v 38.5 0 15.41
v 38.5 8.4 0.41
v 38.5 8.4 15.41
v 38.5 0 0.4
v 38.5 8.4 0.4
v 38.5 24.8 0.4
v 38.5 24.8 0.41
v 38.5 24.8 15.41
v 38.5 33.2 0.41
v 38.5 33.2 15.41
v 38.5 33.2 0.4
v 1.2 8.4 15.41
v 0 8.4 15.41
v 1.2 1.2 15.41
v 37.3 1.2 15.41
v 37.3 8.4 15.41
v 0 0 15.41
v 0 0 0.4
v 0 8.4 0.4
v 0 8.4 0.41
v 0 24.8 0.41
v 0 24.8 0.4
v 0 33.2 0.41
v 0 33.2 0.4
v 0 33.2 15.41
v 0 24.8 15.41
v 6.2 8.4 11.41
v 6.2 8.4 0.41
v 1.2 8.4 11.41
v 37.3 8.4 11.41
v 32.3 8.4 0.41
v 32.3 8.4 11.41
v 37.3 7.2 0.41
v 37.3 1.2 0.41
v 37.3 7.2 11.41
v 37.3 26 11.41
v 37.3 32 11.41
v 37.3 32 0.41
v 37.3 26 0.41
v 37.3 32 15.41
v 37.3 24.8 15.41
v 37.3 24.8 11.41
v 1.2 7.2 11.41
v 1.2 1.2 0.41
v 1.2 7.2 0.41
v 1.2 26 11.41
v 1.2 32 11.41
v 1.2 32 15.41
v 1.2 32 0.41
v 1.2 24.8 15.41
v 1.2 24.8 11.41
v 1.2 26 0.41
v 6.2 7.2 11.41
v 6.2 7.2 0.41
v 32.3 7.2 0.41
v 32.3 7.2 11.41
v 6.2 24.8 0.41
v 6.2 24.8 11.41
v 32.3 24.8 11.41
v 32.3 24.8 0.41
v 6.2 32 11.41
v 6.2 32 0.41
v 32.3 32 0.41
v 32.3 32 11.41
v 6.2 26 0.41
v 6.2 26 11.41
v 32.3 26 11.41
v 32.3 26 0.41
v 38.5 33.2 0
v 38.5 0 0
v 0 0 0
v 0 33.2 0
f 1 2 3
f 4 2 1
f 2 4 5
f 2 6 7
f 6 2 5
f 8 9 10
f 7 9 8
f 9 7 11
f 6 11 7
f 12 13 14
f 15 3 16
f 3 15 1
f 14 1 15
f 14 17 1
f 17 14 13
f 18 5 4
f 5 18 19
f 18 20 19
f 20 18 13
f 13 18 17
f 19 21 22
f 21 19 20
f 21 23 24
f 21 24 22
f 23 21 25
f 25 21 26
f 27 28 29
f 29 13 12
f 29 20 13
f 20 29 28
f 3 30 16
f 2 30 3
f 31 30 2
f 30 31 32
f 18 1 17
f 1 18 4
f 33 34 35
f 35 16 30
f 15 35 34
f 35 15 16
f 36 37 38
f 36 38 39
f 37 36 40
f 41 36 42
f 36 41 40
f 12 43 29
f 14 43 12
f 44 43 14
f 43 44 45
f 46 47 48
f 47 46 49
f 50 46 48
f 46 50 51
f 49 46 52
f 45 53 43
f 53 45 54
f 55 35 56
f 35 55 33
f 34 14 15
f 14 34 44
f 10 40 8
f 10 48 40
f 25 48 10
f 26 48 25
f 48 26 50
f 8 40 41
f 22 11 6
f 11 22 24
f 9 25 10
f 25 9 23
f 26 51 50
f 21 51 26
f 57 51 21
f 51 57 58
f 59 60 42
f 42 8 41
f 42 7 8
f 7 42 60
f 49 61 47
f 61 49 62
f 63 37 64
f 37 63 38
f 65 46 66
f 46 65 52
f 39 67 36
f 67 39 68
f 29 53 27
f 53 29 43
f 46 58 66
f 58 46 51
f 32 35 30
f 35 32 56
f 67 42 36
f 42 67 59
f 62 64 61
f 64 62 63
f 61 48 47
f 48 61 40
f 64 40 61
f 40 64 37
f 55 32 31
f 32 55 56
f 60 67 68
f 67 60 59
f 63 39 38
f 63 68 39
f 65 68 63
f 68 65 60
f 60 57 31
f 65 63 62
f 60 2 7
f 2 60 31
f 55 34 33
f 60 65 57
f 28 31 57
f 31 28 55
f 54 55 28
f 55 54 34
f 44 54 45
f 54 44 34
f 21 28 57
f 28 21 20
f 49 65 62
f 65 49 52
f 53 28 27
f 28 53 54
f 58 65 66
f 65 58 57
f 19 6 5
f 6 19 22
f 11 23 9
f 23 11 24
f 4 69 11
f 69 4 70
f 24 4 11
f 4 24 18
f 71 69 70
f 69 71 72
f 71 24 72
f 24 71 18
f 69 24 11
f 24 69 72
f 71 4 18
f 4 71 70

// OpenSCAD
// file: ../../Base/Boxes.scad
// Fischertechnik Box Foundation
// Pre-designed Boxes

use <Constants.scad>

include <PlacementOptions.scad>

box190Width = 190;
box190Depth = 130;
box130Width = 130;
box130Depth = 95;
boxUsageHeight = 33.9;
boxWallThickness = 2.4;
boxBaseThickness = 1.0;
boxWebWidth = 3.0;

// getBoxWallThickness()
// Gets the wall thickness of a Fischertechnik Box

function getBoxWallThickness() = boxWallThickness;

// Gets the usable height of a fischertechnik box
function getBoxUsageHeight() = boxUsageHeight;

// Gets the thickness of the Fischertechnik box base.
function getBoxBaseThickness() = boxBaseThickness;

// Gets the width of a box web
function getBoxWebWidth() = boxWebWidth;

// Gets the usable inner space of a Box 190 as an x/y-list
function getBox190Space() = [
    box190Width - 2*getBoxWallThickness(), 
    box190Depth - 2*getBoxWallThickness() ];

// Imports the Fischertechnik empty box 130x190 mm and places it at position 0,0
// 190x130 are the outer sizes, the inner space is slightly smaller. Use getBox190Space() to get the inner sizes.
// This module needs the STL file "Fischertechnik Box 130x190.stl" in the library path.
// The box is positioned that the usable inner space is at the 0,0,0 position. The

module Box190() {
    translate([-getBoxWallThickness(),-getBoxWallThickness(),-getBoxBaseThickness()])
        import("Fischertechnik Box 130x190.stl", convexity=3);
}

// Gets the usable inner space of a Box 130 as an x/y-list
function getBox130Space() = [
    box130Width - 2*getBoxWallThickness(), 
    box130Depth - 2*getBoxWallThickness() ];

// Imports the Fischertechnik empty box 95x130 mm and places it at position 0,0
// 190x130 are the outer sizes, the inner space is slightly smaller. Use getBox190Space() to get the inner sizes.
// This module needs the STL file "Fischertechnik Box 95x130.stl" in the library path.
// The box is positioned that the usable inner space is at the 0,0,0 position. The

module Box130() {
    translate([-getBoxWallThickness(),-getBoxWallThickness(),-getBoxBaseThickness()])
        import("Fischertechnik Box 95x130.stl", convexity=3);
}

// Creates a web at the specified box walls
// corner 0 = LowerLeft, 1 = UpperLeft, 2 = UpperRight, 3 = LowerRight
// side 0 = LeftOfCorner, 1 = RightOfCorner
// distance = Distance in mm from the corner
// box = inner width and depth of the box (default: Box 190)
// webWidth = length of the web (default is 3 mms)
// webThickness = thickness of the web (default is 1 mm)

module BoxWeb(corner, side, distance, box=getBox190Space(), webWidth=getBoxWebWidth(), webThickness=1.0) {
    sink = getBoxWallThickness()/2;

    width = (corner % 2 == 0) ? 
            (side == LeftOfCorner ? webWidth : webThickness) :
            (side == LeftOfCorner ? webThickness : webWidth);

    depth = (corner % 2 == 0) ? 
            (side == RightOfCorner ? webWidth : webThickness) :
            (side == RightOfCorner ? webThickness : webWidth);
    
    xDiff = corner == LowerLeft ? 
                (side == LeftOfCorner ? -sink : distance) :
            (corner == UpperLeft ?                
                (side == LeftOfCorner ? distance : -sink) :
            (corner == UpperRight ?
                (side == LeftOfCorner ? box.x-webWidth+sink : box.x-distance-webThickness) :
                (side == LeftOfCorner ? box.x-distance-webThickness: box.x-webWidth+sink)));

    yDiff = corner == LowerLeft ? 
                (side == RightOfCorner ? -sink : distance) :
            (corner == UpperLeft ?
                (side == RightOfCorner ? box.y-distance : box.y-webWidth+sink) :
            (corner == UpperRight ?
                (side == RightOfCorner ? box.y-webWidth+sink : box.y-distance) :
                (side == RightOfCorner ? distance : -sink)));
    
    translate([xDiff, yDiff, -getExcess()])
        cube([width, depth, boxUsageHeight + 2*getExcess()]);
}
// file: ../../Base/Rotation.scad
// Fischertechnik Box Foundation
// Geometry Helpers Rotation

include <PlacementOptions.scad>

// getRotatedSpace(space, rotation=NoRotation)
// Rotates the space dependent on the specified rotation

function getRotatedSpace(space, rotation=NoRotation) = [
    (rotation == Rotate90 || rotation == Rotate270) ? space.y : space.x,
    (rotation == Rotate90 || rotation == Rotate270) ? space.x : space.y
];

// Rotates the given space around the fixed left lower corner
// space = the space the children needs as width/depth list [width,depth]
// rotation = 0 Rotate0 degrees, 1 Rotate90 degrees, 2 Rotate180 degrees, 3 Rotate270 degrees (equivalent to -90)

module RotateFix(space, rotation=Rotate0) {
    dy = (rotation == Rotate0 || rotation == Rotate270) ? 0 :
        (rotation == Rotate90) ? space.x :
        space.y;
    dx = (rotation < Rotate180) ? 0 :
        (rotation == Rotate180) ? space.x :
        space.y;
    
    translate([dx, dy, 0])
        rotate([0, 0, rotations[rotation]])
            children();
}
// file: ../../Base/Alignment.scad
// Fischertechnik Box Foundation
// Geometry Helpers Alignment

include <PlacementOptions.scad>

// getAlignedX(elementWidth, spaceWidth, align=AlignRight, offset=0)
// Gets the aligned X offset of an element with the given
// width in the given space.
// elementWidth = The width of the element to positon
// spaceWidth = The space where the element should be aligned
// align = 0 AlignLeft, 1 AlignCenter, 2 AlignRight
// offset = an optional offset from the aligned position. When
// aligned left or centered, then positive values are in X direction.
// When aligned right then positive values are in negative X direction.

function getAlignedX(elementWidth, spaceWidth, align=AlignRight, offset=0) =
    (align == AlignLeft) ?
        offset :
        ((align == AlignCenter) ?
        (spaceWidth - elementWidth)/2 + offset :
        spaceWidth - offset - elementWidth);

// getAlignedY(elementDepth, spaceDepth, align=AlignTop, offset=0)
// Gets the aligned Y offset of an element with the given
// depth in the given space.
// elementDepth = The depth of the element to positon
// spaceDepth = The space where the element should be aligned
// align = 0 AlignBottom, 1 AlignCenter, 2 AlignTop
// offset = an optional offset from the aligned position. When
// aligned bottom or centered, then positive values are in Y direction.
// When aligned top then positive values are in negative Y direction.

function getAlignedY(elementDepth, spaceDepth, align=AlignTop, offset=0) =
    (align == AlignBottom) ?
        offset :
        ((align == AlignCenter) ?
        (spaceDepth - elementDepth)/2 + offset :
        spaceDepth - offset - elementDepth);
// file: ../../Base/PlacementOptions.scad
// Fischertechnik Box Foundation
// Placement Options

// Alignment
NoAlign = 0;
AlignLeft = 1;
AlignBottom = 2;
AlignCenter = 3;
AlignRight = 4;
AlignTop = 5;

// Element rotation degree steps
rotations = [0, -90, -180, -270];

// Rotation
NoRotation = 0;
Rotate0 = 0;
Rotate90 = 1;
Rotate180 = 2;
Rotate270 = 3;

// Docking (seen from above)
NoDock = -1;
DockLeft = 0;
DockTop = 1;
DockRight = 2;
DockCorner = 2;
DockBottom = 3;

// Web corners
LowerLeft = 0;
UpperLeft = 1;
UpperRight = 2;
LowerRight = 3;

// Web position relative to corner
LeftOfCorner = 0;
RightOfCorner = 1;
// file: ../../Base/Placement.scad
// Fischertechnik Box Foundation
// Geometry Helpers Placement

use <Constants.scad>
use <Alignment.scad>
use <Rotation.scad>
use <Boxes.scad>

include <PlacementOptions.scad>

// Place(x=0, y=0, elementSpace=[0,0], alignX=AlignLeft, alignY=AlignBottom, rotation=Rotate0, boxSpace=getBox190Space())
// Places the child at the specified position
// y = Y-Position. This is a relative position when an X aligment is specified.
// x = X-Position. This is a relative position when an Y aligment is specified.
// elementSpace = space of the element to be placed [x,y]
// alignX = -1=NoAlign, 0 AlignLeft, 1 AlignCenter, 3 AlignRight (elementSpace and boxSpace required!)
// alignY = -1=NoAlign, 2 AlignBottom, 1 AlignCenter, 4 AlignTop (elementSpace and boxSpace required!)
// rotation = 0 Rotate0 0 degrees, 1 Rotate90 90 degrees, 
// 2 Rotate180 180 degrees, 3 Rotate270 270 degrees (equivalent to -90)
// boxSpace = Inner space of the box where the placement occurs [x,y] - default is Box 190x130 inner space

module Place(x=0, y=0, elementSpace=[0,0], 
  alignX=AlignLeft, alignY=AlignBottom, 
  rotation=NoRotation, boxSpace=getBox190Space()) {

    module Position(x, y, space, rotation=Rotate0) {
        translate([x, y, 0])
            RotateFix(space, rotation)
                children();
    }

    space = getRotatedSpace(elementSpace, rotation);
    alignedX = getAlignedX(space.x, boxSpace.x, alignX, x);
    alignedY = getAlignedY(space.y, boxSpace.y, alignY, y);
    Position(alignedX, alignedY, elementSpace, rotation)
        children();
}

// Center(space=getBox130Space(), elementSpace=[0,0])
// space = Space where the children is centered. For cylinder use centered=true and no elementSpace.
// elementSpace = space of the element to be centered [x,y]

module Center(space=getBox190Space(), elementSpace=[0,0]) {
    translate([(space.x - elementSpace.x) / 2, (space.y - elementSpace.y) / 2])
        children(0);
}

// CenterHorizontal(width=0, y=0, offset=0, space=getBox130Space())
// space = Space where the children is centered. For cylinder use centered=true and no elementSpace.
// elementSpace = space of the element to be centered [x,y]

module CenterHorizontal(width=0, y=0, offset=0, space=getBox190Space()) {
    translate([(space.x - width) / 2 + offset, y])
        children(0);
}

// CenterVertical(depth=0, x=0, offset=0, space=getBox130Space())
// space = Space where the children is centered. For cylinder use centered=true and no elementSpace.
// elementSpace = space of the element to be centered [x,y]

module CenterVertical(depth=0, x=0, offset=0, space=getBox190Space()) {
    translate([x, (space.y - depth) / 2 + offset])
        children(0);
}
// file: ../../Elements/AxisClip10.scad
// Fischertechnik Box Library
// Axis for clip 10
// 31023

use <../ModelBase/Simple.scad>

width = 12;
depth = 12;
height = 23;

// getAxisClip10Space()
// Gets the space of a frame for a clip 10 with spring ring (mot2)

function getAxisClip10Space() = [width, depth, height];

// AxisClip10()
// Axis for clip 10 with spring ring (mot2)

module AxisClip10() {
    LeveledAxisWithSpace(height, height-10, getAxisClip10Space());
}

// Tests
color("lightgray")
AxisClip10();
// file: ../../Base/Constants.scad
// Fischertechnik Box Foundation
// Constants

// Constant values necessary for multiple elements

// Base constants
dividerThickness = 1.2;
excess = 0.01;
fragments = 90;
tolerance = 0.8;

// Gets the thickness of a divider 
function getDividerThickness() = dividerThickness;

// Gets the excess that is used to merge walls into each other
function getExcess() = excess;

// Gets amount of fragments of a cylinder
function getFragments() = fragments;

// Gets the inner tolerance of a frame to each side
function getTolerance() = tolerance;


// Fischertechnik specific constants
axisDiameter = 4;
axisBottomDiameter = axisDiameter + 1;
standardEdgeDistance = 2.5;
standardWebDistance = 11.5;
standardCornerLength = 15;
tubeWallFactor = 0.8;

// Gets axis diameter
function getAxisDiameter() = axisDiameter;

// Gets axis bottom diameter for thicker part at the bottom
function getAxisBottomDiameter() = axisBottomDiameter;

// gets the standard distance to the wall of the box for dockable frames with webs
function getStandardEdgeDistance() = standardEdgeDistance;

// gets the standard distance of each web to the corner of the dockable frame
function getStandardWebDistance() = standardWebDistance;

// gets the standard length of the corner walls of a dockable frame
function getStandardCornerLength() = standardCornerLength;

// gets the wall thickness of a tube.
function getTubeWallThickness() = tubeWallFactor * getDividerThickness();
// file: ../../Elements/FrameConcaveMirror.scad
// Fischertechnik Box Library
// Frame for Concave Mirror
// 31369 

use <../Base/Constants.scad>
use <../ModelBase/Simple.scad>
use <../ModelBase/Complex.scad>

width = 35.3;
depth = 30;
height = 11;

// getFrameConcaveMirrorSpace()
// Gets the outer space the concave mirror frame needs.

function getFrameConcaveMirrorSpace() = getFrameOuterVolume([width, depth, height]);

// FrameConcaveMirror()
// Frame for 30 mm concave mirror.

module FrameConcaveMirror() {
    FrameSpecialFlat([width, depth, height]);
}

// Tests
color("lightgray") {
FrameConcaveMirror();
}
// file: ../TestPrint.scad
// 3D Print Test Base

use <../Base/Constants.scad>

use <../Elements/AxisClip10.scad>

module TestPrint(elementSpace) {
    cube([elementSpace.x, elementSpace.y, 0.4]);
    translate([0,0,0.4+getExcess()]) {
        children();
    }
}

TestPrint(getAxisClip10Space())
    AxisClip10();
// main file
// 3D Print Test Base
// FrameConcaveMirror

use <../TestPrint.scad>
use <../../Elements/FrameConcaveMirror.scad>

TestPrint(getFrameConcaveMirrorSpace())
    FrameConcaveMirror();
